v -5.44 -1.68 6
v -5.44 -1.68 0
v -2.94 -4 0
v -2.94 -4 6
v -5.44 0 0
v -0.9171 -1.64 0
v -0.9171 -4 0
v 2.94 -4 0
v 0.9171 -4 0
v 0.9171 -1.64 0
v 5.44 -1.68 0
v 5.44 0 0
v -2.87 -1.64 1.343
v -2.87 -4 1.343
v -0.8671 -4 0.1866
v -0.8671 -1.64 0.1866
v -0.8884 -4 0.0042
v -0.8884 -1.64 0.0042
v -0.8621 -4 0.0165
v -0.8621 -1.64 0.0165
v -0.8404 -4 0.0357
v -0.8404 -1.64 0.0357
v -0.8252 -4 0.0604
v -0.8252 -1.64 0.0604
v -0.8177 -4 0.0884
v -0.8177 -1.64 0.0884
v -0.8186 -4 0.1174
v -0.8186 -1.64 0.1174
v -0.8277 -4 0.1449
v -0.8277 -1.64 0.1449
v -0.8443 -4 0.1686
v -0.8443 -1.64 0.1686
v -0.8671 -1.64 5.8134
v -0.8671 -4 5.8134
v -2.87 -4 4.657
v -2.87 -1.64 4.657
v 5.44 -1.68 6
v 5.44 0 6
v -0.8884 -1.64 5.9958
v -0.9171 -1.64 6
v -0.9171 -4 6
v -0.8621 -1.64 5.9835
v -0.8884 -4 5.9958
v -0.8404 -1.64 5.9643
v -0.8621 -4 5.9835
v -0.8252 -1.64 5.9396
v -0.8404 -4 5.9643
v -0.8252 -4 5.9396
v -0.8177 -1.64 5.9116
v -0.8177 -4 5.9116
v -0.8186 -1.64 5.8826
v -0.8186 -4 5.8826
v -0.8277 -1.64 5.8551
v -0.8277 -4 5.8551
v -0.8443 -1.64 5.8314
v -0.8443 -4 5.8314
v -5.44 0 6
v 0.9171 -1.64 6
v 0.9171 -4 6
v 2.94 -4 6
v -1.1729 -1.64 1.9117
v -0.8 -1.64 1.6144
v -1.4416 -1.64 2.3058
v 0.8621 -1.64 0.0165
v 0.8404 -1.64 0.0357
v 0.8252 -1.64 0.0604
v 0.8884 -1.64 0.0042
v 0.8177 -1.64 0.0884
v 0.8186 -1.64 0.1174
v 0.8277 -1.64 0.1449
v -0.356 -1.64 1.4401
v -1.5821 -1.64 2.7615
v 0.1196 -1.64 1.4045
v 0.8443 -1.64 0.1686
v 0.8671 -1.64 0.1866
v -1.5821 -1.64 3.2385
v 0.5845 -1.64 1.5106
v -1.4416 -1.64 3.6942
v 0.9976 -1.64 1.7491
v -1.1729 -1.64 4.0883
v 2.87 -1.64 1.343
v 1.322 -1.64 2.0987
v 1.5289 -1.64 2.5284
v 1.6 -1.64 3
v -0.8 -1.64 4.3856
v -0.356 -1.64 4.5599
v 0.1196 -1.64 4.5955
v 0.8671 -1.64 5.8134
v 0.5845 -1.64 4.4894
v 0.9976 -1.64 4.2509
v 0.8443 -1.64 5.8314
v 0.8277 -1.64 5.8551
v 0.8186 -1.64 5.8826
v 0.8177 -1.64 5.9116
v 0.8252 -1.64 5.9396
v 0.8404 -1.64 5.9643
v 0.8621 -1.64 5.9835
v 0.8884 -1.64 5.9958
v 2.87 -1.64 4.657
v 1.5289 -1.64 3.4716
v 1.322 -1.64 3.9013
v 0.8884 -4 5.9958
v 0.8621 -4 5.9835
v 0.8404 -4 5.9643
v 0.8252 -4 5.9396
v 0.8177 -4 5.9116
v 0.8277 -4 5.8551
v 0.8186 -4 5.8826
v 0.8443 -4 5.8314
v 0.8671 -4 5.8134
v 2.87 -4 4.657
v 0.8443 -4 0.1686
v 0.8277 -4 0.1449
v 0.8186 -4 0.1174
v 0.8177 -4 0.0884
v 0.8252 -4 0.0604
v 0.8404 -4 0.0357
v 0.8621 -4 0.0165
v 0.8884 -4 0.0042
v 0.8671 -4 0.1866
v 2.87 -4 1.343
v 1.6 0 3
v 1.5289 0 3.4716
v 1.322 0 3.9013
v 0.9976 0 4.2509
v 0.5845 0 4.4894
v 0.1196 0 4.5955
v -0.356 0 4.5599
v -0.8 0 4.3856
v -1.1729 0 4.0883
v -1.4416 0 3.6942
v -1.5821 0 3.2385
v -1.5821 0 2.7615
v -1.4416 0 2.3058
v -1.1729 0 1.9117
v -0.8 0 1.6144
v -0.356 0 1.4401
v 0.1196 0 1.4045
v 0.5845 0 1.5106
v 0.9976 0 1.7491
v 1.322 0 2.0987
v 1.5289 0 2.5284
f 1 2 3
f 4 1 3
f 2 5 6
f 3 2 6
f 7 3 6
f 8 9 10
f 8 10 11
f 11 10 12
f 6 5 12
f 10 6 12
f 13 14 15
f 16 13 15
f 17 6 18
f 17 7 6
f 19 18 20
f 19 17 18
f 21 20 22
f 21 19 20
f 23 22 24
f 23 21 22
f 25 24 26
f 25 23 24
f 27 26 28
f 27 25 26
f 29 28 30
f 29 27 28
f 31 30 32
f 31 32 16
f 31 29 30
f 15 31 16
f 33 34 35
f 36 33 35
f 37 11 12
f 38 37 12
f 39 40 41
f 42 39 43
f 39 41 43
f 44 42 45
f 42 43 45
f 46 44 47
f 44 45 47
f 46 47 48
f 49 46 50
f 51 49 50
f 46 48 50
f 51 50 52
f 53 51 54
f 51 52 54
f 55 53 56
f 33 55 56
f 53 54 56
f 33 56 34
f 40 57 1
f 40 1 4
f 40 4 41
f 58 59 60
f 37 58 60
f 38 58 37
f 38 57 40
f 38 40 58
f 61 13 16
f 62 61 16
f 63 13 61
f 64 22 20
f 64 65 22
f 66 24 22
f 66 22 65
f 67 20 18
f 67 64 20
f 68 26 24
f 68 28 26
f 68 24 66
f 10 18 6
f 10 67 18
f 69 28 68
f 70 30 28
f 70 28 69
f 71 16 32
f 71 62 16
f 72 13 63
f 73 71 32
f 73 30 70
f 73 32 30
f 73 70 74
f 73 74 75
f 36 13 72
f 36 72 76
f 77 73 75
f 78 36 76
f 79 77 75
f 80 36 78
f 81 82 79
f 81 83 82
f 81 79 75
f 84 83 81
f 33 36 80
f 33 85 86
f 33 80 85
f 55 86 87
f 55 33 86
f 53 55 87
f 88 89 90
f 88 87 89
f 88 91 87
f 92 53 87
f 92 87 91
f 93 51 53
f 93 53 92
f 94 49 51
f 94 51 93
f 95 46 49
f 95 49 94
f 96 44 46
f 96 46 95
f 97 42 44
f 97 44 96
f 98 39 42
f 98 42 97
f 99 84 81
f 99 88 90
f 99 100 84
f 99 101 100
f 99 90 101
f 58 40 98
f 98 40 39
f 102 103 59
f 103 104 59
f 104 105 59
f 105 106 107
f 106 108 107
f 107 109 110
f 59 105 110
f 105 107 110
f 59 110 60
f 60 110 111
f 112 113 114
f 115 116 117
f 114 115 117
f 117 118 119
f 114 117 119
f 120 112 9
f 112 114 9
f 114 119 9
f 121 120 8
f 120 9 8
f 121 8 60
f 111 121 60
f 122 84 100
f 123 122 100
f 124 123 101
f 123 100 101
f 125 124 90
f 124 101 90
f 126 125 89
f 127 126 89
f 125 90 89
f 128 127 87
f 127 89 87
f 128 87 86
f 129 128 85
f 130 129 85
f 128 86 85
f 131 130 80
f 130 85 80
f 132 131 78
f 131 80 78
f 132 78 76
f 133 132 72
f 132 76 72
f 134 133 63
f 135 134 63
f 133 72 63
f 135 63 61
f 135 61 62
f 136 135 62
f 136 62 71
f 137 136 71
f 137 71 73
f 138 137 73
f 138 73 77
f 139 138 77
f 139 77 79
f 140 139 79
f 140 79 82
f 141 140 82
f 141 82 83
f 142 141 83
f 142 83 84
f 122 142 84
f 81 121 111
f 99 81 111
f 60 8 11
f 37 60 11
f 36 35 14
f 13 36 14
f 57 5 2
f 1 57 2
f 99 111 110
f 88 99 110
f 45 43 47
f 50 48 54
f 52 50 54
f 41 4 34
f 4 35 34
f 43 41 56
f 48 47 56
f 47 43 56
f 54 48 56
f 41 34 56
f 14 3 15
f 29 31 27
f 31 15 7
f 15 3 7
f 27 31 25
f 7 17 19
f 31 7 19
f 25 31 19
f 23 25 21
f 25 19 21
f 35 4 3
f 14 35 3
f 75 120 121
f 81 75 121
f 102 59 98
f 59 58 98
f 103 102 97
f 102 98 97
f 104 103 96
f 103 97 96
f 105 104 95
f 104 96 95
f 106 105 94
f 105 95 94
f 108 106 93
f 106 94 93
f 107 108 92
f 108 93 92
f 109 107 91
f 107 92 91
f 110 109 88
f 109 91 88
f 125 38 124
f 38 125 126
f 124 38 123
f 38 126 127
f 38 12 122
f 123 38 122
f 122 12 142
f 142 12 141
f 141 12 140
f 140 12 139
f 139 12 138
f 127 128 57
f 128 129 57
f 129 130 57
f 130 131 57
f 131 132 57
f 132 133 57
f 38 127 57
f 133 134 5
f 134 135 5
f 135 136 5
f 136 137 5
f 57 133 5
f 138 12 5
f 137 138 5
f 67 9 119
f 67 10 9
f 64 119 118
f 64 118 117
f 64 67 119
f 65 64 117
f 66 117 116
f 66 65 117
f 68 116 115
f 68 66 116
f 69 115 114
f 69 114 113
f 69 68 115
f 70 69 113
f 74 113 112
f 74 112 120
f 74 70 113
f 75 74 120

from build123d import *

# Parameters (mm, degrees)
PAD_DEPTH       = 6
SKETCH001_R     = 1.6
POCKET_DEPTH    = 4.001
POCKET001_DEPTH = 2.36
FILLET_R        = 0.1


with BuildPart() as part:
    # Sketch → Pad (new body)
    with BuildSketch(Plane.XY):
        Polygon((0, 0), (-5.44, 0), (-5.44, -1.68), (-2.94, -4), (0, -4), (2.94, -4), (5.44, -1.68), (5.44, 0), align=None)
    extrude(amount=PAD_DEPTH)

    # Sketch001 (on Face5 of Pad) → Pocket (cut, through all)
    with BuildSketch(Plane.XZ.offset(4)):
        with Locations((0, 3)):
            Circle(SKETCH001_R)
    extrude(amount=-POCKET_DEPTH, mode=Mode.SUBTRACT)

    # Sketch002 (on Face8 of Pocket) → Pocket001 (cut)
    with BuildSketch(Plane.XZ.offset(4)):
        Polygon((-2.87, 4.656995), (-2.87, 1.343005), (0, -0.313991), (2.87, 1.343005), (2.87, 4.656995), (0, 6.313991), align=None)
    extrude(amount=-POCKET001_DEPTH, mode=Mode.SUBTRACT)

    # Fillet
    fillet_edges = [part.edges().sort_by_distance(p)[0] for p in [
        (-0.543848, -2.82, 6),
        (0.543848, -2.82, 6),
        (0.543848, -2.82, 0),
        (-0.543848, -2.82, 0),
    ]]
    fillet(fillet_edges, radius=FILLET_R)


solid = part.part
